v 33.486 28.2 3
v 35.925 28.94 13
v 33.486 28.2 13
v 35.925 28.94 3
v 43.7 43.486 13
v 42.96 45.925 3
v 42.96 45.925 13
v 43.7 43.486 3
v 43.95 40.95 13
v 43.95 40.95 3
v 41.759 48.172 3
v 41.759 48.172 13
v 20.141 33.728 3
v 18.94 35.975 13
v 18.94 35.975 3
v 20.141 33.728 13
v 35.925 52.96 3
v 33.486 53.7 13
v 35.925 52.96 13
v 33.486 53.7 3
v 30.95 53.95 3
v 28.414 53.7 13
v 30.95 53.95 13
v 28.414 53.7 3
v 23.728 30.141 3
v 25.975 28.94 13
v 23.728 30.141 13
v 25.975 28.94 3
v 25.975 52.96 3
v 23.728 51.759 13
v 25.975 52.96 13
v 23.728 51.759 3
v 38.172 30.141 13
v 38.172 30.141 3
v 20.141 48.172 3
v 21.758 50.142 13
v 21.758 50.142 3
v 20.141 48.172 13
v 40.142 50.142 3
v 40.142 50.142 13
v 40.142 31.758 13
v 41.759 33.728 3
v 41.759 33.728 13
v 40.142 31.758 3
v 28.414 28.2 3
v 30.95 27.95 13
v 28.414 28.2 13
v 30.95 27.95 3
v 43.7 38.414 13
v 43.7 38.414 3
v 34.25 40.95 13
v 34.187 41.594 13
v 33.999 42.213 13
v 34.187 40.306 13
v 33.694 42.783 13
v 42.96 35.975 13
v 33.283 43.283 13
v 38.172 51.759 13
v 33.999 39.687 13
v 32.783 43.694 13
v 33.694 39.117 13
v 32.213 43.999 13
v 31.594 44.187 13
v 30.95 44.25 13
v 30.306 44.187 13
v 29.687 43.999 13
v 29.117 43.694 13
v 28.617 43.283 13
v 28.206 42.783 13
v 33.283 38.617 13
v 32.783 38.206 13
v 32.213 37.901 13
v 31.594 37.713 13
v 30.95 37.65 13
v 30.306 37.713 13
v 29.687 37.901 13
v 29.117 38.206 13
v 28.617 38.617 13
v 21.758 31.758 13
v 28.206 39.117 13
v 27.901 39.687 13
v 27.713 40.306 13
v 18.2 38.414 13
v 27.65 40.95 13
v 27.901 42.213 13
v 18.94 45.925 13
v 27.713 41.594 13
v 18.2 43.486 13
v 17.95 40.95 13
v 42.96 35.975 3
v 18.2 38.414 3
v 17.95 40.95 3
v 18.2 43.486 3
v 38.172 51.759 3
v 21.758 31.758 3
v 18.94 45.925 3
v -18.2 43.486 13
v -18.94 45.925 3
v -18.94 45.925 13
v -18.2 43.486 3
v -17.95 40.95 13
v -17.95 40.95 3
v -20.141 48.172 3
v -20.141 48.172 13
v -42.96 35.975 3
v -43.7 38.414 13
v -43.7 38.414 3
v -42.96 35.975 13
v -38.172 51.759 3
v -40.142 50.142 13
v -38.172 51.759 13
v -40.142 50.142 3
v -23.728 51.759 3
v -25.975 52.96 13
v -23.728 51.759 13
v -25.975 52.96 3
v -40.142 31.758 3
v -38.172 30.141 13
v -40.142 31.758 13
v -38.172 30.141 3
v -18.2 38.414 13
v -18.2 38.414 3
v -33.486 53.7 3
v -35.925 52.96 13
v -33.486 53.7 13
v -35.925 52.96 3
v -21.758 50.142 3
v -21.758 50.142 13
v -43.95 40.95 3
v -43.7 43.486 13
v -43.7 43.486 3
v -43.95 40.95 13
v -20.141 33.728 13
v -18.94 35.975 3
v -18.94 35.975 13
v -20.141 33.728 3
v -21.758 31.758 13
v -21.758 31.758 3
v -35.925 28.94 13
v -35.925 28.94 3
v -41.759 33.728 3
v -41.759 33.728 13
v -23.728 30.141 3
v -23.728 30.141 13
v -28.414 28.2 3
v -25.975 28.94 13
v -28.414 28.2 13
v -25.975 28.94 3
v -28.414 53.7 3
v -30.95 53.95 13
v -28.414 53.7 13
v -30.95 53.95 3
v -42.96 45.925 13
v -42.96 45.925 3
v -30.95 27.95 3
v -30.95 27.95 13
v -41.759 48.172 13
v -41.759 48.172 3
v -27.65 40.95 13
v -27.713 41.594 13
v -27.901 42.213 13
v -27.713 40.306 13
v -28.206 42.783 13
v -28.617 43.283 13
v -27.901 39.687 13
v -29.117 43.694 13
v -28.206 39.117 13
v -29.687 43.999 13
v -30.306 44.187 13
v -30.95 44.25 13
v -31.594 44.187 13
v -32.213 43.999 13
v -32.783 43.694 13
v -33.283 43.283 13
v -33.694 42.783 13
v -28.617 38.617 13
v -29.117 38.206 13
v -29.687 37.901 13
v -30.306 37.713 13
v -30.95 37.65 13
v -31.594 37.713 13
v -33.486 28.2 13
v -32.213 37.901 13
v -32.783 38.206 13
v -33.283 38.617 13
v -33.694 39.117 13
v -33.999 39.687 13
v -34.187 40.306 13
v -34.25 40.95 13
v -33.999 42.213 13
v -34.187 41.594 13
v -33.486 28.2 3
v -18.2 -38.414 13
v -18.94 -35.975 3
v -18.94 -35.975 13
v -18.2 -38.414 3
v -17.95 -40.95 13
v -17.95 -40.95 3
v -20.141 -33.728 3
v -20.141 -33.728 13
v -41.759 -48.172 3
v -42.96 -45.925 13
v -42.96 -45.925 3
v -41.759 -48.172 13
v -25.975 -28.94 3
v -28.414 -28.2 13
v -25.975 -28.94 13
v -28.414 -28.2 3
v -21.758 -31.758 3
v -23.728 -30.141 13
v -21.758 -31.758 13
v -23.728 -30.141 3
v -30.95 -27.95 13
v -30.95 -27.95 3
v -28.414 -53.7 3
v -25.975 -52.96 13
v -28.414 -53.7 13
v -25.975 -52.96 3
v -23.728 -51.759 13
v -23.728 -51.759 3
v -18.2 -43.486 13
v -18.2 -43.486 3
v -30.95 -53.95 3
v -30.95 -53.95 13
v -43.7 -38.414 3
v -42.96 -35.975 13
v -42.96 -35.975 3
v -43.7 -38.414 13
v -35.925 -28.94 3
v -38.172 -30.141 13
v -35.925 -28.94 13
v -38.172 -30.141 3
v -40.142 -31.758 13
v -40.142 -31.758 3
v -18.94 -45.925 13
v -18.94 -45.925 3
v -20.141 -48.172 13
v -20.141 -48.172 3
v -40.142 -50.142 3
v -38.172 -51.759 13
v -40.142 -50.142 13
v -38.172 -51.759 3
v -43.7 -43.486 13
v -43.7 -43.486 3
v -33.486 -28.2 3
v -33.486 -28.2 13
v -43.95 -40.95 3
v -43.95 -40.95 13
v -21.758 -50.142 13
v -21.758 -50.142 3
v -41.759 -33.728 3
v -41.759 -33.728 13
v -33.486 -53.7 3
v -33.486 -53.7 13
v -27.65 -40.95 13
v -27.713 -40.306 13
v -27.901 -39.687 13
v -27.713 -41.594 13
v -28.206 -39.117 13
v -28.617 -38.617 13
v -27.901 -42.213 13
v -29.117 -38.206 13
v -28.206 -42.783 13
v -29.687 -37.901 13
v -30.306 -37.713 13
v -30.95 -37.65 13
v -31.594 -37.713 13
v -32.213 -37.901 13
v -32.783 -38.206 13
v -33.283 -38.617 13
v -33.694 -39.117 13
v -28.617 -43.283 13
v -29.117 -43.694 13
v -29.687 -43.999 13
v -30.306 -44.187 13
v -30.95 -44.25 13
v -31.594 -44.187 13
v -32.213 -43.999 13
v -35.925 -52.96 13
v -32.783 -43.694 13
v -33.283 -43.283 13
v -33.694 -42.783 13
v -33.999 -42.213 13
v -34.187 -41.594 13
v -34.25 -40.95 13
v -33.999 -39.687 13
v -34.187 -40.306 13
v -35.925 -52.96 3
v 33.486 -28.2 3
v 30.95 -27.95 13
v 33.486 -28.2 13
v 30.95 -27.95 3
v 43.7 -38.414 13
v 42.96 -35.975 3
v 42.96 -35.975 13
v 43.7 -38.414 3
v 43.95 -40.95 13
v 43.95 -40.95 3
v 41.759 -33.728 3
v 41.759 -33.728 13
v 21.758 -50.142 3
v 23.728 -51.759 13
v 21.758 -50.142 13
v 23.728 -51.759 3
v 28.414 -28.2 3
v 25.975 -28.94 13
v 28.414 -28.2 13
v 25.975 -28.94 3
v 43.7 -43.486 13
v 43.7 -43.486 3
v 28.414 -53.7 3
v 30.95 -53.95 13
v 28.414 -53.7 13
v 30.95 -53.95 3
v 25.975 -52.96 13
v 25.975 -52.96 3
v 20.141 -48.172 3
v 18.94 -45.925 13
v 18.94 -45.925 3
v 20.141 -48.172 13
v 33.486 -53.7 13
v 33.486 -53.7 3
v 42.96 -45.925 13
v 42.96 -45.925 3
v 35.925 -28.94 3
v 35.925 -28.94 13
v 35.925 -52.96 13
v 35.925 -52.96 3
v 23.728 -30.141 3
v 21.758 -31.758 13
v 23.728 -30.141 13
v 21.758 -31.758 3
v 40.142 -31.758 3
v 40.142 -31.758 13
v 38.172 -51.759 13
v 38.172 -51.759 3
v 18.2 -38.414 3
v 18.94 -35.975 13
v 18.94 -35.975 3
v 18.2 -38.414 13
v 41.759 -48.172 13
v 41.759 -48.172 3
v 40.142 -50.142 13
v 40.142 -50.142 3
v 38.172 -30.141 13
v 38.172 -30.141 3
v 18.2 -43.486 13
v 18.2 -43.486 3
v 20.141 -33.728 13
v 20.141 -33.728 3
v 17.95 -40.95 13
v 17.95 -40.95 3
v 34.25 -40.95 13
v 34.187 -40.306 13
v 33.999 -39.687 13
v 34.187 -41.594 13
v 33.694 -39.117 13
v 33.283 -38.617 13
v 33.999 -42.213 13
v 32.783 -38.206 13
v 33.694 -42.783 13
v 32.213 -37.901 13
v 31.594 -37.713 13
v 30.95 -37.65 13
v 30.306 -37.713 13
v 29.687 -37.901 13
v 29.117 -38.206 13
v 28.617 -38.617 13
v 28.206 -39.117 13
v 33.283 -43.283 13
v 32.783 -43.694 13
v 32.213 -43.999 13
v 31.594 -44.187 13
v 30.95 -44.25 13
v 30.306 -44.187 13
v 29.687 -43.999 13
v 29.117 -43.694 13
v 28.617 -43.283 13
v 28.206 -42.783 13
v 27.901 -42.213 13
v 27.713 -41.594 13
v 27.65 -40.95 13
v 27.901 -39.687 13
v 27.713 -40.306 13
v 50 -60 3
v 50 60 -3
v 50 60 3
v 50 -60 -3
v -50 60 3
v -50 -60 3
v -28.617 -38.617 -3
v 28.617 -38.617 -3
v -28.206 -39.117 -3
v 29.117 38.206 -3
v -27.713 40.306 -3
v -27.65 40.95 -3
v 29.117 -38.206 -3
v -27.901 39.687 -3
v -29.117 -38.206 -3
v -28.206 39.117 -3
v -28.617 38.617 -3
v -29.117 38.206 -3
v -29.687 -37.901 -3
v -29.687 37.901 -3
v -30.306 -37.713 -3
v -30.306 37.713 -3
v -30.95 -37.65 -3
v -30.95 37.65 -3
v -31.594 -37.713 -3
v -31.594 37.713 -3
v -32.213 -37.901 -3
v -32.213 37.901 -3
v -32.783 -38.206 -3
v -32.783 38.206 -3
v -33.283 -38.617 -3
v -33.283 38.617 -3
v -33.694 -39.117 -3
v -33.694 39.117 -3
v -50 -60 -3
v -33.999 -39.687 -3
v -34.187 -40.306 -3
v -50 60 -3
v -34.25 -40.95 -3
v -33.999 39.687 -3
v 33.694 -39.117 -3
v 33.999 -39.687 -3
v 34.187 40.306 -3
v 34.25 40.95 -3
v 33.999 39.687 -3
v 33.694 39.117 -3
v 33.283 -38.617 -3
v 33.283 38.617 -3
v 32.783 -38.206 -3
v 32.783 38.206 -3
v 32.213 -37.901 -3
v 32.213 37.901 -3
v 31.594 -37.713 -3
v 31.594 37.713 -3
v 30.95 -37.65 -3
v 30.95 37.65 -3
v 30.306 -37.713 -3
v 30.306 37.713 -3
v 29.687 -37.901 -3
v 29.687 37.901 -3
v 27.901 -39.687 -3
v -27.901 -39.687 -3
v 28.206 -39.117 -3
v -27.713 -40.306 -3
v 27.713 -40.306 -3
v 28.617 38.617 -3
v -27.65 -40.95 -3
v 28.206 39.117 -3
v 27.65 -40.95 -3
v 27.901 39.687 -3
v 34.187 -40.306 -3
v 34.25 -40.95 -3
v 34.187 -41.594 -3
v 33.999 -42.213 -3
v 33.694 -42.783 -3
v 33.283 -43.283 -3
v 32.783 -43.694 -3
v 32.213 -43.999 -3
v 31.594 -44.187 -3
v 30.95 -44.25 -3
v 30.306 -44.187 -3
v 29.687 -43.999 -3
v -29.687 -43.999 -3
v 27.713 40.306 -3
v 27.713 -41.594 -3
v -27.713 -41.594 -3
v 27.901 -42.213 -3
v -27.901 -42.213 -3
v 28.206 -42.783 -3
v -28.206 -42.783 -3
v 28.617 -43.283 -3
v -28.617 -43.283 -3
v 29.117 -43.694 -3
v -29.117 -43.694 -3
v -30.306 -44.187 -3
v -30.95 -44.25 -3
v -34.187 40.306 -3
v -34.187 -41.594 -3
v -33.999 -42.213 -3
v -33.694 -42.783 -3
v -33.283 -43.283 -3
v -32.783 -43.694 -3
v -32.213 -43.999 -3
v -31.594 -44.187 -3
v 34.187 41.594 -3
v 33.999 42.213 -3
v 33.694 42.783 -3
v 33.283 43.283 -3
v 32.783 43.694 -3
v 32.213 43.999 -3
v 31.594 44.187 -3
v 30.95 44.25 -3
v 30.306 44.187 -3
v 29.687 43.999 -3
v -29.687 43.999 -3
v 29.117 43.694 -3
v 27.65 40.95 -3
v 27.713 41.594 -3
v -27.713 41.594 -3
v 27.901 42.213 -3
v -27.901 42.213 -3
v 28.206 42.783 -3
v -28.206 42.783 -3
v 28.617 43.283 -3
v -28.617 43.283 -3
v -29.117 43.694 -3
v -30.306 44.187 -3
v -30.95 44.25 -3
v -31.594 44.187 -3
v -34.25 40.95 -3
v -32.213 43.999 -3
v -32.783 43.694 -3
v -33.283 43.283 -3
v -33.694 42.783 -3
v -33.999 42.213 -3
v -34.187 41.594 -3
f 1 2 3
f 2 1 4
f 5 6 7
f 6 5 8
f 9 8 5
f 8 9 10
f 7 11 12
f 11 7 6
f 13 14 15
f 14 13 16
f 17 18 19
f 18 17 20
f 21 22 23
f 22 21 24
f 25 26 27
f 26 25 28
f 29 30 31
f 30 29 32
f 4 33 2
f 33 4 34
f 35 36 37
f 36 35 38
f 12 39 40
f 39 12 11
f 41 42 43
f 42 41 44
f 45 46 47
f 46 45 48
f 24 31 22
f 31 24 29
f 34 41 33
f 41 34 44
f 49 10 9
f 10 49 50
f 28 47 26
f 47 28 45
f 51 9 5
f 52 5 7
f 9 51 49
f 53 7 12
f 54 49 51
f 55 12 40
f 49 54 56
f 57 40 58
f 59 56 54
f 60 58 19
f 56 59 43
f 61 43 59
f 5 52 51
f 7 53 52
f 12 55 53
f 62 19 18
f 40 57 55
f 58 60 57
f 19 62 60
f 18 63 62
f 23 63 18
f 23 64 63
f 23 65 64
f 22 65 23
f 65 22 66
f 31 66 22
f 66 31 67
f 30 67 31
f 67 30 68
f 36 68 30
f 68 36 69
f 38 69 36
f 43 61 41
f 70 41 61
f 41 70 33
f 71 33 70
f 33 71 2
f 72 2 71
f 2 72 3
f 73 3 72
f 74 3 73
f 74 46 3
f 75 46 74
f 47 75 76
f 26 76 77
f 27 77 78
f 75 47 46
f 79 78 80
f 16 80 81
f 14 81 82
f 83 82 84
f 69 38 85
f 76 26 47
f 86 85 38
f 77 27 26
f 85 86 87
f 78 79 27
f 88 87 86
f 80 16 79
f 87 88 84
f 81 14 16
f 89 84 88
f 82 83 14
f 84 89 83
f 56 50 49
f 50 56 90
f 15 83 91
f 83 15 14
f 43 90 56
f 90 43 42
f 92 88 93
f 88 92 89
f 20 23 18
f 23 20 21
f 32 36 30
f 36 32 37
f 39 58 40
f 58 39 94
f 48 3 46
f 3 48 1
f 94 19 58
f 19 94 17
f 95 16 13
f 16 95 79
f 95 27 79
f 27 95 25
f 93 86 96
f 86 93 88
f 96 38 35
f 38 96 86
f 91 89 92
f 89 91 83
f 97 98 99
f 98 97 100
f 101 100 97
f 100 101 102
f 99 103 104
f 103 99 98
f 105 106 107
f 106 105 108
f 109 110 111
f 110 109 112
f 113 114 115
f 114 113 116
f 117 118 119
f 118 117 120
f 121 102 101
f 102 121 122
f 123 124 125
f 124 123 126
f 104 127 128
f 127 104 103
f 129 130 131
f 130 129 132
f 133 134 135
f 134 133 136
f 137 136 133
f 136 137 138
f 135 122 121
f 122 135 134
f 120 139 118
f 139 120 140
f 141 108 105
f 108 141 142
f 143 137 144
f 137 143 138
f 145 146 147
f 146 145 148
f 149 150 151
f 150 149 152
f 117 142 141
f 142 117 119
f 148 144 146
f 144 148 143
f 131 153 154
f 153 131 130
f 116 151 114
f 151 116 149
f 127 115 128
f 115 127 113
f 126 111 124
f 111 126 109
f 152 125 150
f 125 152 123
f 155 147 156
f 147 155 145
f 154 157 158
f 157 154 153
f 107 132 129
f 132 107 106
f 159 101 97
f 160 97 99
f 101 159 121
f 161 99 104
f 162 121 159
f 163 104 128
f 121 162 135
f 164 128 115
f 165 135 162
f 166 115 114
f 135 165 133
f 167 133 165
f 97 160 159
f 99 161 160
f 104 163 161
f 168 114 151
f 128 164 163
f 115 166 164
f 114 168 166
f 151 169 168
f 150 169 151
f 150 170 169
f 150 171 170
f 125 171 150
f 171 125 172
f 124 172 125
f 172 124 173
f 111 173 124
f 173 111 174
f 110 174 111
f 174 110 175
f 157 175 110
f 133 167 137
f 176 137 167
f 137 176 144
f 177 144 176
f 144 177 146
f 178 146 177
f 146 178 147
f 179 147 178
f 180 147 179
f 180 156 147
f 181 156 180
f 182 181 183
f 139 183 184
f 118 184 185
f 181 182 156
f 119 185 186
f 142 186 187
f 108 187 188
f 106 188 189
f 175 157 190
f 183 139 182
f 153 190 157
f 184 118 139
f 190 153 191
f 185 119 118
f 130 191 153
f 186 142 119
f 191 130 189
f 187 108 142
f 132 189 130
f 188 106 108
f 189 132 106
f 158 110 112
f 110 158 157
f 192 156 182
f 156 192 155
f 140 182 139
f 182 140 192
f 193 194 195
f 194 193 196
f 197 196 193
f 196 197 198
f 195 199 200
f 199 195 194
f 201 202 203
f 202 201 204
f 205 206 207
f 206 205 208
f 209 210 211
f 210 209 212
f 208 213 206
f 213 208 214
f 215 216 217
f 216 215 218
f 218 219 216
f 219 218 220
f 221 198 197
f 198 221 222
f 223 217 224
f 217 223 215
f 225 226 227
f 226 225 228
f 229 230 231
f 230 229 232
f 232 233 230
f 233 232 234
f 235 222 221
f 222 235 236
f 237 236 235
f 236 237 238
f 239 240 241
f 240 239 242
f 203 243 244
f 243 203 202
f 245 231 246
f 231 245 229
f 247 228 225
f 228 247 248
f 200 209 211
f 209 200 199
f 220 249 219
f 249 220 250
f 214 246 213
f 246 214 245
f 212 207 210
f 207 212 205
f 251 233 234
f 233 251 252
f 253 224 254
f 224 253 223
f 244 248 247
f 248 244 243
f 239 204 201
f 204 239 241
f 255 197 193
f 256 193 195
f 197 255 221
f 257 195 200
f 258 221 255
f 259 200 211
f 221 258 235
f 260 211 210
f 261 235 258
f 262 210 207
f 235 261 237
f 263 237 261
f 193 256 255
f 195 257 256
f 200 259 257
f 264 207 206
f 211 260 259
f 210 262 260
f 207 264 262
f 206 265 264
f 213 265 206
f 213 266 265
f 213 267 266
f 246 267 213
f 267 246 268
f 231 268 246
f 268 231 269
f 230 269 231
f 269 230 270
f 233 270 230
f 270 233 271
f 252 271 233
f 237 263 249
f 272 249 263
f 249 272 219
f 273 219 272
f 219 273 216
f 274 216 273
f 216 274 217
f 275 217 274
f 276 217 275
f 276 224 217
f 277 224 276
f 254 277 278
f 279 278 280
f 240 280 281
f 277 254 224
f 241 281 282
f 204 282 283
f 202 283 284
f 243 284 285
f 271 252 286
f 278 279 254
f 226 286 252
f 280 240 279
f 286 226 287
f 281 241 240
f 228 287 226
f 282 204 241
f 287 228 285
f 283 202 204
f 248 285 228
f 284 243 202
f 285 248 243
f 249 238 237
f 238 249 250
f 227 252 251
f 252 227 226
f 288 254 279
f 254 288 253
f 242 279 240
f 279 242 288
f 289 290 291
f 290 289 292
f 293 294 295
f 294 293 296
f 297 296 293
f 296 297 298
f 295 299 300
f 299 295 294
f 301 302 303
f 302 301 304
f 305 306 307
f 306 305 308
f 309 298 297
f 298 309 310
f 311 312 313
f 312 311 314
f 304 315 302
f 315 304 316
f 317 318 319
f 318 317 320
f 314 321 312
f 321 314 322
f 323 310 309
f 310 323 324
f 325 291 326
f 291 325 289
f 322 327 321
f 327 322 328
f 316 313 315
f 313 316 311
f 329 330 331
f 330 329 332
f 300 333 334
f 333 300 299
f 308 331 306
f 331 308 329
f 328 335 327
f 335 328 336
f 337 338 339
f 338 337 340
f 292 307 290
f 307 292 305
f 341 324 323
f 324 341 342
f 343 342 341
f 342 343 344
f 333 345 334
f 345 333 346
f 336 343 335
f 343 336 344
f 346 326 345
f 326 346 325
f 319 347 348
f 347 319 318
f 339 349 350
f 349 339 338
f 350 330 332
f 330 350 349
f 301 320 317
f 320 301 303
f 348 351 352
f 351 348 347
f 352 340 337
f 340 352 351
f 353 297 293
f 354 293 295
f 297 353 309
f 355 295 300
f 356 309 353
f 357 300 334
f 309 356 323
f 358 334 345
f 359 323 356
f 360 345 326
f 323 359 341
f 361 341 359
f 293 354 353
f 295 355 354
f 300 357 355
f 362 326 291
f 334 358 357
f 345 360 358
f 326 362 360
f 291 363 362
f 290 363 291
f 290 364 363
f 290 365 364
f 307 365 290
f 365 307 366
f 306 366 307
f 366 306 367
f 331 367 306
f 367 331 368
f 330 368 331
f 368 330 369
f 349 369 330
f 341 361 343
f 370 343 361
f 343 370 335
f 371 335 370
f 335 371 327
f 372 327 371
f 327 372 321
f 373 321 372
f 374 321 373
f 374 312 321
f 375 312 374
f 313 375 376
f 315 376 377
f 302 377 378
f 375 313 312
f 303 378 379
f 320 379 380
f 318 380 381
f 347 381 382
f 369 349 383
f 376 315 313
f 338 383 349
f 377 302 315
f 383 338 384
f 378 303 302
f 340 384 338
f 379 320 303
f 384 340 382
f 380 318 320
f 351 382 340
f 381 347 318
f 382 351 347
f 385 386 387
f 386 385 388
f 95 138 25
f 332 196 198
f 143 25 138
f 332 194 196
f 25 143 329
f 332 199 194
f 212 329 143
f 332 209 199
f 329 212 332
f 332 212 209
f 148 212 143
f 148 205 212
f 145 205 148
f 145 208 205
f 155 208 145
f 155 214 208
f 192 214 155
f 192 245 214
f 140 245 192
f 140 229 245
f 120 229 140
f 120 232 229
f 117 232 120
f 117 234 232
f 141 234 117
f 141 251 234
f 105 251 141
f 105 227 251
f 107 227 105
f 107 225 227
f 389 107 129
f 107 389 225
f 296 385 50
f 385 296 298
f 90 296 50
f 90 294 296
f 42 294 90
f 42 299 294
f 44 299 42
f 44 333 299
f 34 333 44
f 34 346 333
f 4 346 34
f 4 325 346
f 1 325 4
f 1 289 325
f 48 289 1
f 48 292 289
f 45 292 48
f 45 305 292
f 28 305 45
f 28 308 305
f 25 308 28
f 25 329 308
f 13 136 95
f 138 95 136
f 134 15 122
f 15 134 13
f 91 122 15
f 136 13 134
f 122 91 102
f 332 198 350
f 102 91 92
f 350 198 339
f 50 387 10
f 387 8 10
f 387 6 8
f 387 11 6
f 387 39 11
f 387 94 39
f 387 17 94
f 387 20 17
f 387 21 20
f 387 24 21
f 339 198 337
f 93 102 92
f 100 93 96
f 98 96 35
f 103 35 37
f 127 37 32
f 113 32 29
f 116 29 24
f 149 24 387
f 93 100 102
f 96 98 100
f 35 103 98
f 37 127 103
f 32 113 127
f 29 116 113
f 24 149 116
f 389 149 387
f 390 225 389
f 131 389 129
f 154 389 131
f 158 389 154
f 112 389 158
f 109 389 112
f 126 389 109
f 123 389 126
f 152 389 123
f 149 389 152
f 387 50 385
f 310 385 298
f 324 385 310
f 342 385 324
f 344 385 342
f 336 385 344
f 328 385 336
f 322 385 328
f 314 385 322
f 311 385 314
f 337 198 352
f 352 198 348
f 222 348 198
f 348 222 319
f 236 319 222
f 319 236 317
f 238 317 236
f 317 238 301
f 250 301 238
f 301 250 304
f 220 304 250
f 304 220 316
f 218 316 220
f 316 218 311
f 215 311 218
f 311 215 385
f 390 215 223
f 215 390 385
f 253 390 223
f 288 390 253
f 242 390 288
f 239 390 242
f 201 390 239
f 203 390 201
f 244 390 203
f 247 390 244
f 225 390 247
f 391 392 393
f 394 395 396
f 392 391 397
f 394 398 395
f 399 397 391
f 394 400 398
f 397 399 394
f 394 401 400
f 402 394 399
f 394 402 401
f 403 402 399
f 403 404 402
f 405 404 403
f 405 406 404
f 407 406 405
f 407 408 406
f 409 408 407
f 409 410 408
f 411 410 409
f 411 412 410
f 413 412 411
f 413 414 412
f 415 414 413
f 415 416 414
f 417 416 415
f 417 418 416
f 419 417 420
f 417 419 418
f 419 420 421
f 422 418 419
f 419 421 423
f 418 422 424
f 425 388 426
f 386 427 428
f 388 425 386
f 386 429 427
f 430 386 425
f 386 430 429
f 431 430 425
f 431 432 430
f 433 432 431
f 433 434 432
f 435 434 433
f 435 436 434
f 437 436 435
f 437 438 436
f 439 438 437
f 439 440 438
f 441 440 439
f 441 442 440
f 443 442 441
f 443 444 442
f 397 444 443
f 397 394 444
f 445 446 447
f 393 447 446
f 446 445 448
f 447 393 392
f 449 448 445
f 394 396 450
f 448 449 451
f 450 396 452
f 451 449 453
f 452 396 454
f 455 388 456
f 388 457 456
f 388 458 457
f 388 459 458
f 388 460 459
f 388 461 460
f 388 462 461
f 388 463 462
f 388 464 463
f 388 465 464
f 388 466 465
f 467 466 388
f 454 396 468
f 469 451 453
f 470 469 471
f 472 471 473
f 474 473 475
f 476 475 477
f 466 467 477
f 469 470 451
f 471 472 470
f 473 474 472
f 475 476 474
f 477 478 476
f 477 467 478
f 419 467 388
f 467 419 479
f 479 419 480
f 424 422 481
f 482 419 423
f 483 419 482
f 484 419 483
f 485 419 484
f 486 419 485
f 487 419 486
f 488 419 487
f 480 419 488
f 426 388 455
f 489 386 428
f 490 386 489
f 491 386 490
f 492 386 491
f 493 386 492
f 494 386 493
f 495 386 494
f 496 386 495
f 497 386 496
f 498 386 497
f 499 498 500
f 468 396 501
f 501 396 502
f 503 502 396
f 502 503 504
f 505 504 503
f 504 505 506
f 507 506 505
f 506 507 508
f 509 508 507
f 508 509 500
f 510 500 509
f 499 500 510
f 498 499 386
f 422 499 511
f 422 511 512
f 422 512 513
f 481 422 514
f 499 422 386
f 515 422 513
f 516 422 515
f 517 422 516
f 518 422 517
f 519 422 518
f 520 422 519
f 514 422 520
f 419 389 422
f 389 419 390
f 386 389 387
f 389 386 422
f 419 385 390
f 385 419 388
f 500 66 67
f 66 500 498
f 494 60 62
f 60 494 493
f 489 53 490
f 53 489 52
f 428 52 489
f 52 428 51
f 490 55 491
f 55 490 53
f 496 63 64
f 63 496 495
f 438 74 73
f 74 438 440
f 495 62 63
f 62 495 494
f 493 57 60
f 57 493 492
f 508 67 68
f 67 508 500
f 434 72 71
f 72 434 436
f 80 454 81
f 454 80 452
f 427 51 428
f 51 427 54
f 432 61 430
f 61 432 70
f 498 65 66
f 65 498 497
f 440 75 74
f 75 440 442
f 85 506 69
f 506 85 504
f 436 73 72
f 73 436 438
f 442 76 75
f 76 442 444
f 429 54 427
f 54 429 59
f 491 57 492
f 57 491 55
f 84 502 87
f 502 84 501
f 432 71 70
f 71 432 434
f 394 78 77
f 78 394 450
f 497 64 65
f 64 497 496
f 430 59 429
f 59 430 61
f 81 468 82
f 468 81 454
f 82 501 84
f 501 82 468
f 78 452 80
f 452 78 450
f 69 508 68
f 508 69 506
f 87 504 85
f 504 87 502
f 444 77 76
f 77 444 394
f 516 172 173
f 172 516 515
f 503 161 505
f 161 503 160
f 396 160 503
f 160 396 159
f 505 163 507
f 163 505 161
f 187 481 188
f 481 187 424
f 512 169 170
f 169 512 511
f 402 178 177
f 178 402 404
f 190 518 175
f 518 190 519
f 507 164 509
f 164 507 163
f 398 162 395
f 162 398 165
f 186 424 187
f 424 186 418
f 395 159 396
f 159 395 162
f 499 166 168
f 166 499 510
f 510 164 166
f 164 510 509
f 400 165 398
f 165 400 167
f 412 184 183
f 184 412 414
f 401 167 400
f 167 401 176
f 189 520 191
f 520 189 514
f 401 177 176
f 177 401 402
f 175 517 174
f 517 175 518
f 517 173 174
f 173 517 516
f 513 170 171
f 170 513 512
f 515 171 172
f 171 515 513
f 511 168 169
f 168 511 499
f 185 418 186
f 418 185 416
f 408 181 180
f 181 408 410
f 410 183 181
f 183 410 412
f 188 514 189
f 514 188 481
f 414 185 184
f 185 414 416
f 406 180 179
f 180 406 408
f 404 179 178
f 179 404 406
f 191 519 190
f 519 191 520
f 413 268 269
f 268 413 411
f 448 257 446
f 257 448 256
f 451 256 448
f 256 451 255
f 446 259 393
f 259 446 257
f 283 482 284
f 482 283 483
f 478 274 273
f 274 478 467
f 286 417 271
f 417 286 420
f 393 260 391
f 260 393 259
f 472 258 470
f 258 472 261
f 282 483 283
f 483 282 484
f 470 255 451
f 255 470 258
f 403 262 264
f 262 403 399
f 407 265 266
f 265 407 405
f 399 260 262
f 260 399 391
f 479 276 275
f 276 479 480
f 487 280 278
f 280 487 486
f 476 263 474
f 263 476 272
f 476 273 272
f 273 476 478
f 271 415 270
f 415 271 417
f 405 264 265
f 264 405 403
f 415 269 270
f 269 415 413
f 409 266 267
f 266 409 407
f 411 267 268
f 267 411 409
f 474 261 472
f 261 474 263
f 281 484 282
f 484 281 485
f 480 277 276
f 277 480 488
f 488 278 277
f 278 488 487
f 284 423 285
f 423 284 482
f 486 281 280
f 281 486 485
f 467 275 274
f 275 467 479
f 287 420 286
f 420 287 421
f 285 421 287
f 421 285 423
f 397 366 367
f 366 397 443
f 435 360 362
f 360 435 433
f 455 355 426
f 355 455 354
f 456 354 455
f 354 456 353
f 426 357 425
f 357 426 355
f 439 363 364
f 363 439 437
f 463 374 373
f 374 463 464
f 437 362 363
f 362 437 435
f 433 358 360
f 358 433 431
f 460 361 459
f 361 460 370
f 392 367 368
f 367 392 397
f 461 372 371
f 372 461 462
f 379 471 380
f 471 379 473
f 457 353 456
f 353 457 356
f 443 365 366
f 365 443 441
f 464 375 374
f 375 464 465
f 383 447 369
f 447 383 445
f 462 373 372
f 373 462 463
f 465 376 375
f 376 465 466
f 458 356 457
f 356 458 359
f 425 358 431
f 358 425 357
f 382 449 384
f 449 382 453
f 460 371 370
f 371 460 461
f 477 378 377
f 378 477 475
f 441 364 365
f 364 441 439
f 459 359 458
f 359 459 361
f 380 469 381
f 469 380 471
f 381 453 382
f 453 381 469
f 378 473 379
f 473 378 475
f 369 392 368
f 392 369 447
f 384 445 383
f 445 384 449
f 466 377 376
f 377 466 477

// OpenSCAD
$fn = 32;

// ----------------------------------------------------------------------
// Anchor pads 100 x 120 x 16
// four corner bosses with anchor holes
// ----------------------------------------------------------------------

// --- parameters (mm) ---
plate = [100, 120, 6];  // base plate size (x, y, z)
pads = 4;               // boss count, one per corner
edge = 19.05;           // boss centre offset from the plate edge
boss_d = 26;            // boss diameter
boss_h = 10;            // boss height above the base plate
hole_d = 6.6;           // hole diameter

// --- derived feature positions (mm) ---
height = plate[2] + boss_h;      // = 16   overall height of the part
corner_x = plate[0] / 2 - edge;  // = 30.95   boss centre X
corner_y = plate[1] / 2 - edge;  // = 40.95   boss centre Y
feature_centers = [
  [corner_x, corner_y],
  [-corner_x, corner_y],
  [-corner_x, -corner_y],
  [corner_x, -corner_y]
];   // boss centres, anchor holes are drilled there

// base plate, four bosses standing on it, anchor holes all the way through
difference() {
  union() {
    cube(plate, center = true);
    for (centre = feature_centers)
      translate([centre[0], centre[1], plate[2] / 2 - 1])
        cylinder(d = boss_d, h = boss_h + 1);
  }
  for (centre = feature_centers)
    translate([centre[0], centre[1], -height])
      cylinder(d = hole_d, h = 2 * height + 2);  // through boss and plate
}
